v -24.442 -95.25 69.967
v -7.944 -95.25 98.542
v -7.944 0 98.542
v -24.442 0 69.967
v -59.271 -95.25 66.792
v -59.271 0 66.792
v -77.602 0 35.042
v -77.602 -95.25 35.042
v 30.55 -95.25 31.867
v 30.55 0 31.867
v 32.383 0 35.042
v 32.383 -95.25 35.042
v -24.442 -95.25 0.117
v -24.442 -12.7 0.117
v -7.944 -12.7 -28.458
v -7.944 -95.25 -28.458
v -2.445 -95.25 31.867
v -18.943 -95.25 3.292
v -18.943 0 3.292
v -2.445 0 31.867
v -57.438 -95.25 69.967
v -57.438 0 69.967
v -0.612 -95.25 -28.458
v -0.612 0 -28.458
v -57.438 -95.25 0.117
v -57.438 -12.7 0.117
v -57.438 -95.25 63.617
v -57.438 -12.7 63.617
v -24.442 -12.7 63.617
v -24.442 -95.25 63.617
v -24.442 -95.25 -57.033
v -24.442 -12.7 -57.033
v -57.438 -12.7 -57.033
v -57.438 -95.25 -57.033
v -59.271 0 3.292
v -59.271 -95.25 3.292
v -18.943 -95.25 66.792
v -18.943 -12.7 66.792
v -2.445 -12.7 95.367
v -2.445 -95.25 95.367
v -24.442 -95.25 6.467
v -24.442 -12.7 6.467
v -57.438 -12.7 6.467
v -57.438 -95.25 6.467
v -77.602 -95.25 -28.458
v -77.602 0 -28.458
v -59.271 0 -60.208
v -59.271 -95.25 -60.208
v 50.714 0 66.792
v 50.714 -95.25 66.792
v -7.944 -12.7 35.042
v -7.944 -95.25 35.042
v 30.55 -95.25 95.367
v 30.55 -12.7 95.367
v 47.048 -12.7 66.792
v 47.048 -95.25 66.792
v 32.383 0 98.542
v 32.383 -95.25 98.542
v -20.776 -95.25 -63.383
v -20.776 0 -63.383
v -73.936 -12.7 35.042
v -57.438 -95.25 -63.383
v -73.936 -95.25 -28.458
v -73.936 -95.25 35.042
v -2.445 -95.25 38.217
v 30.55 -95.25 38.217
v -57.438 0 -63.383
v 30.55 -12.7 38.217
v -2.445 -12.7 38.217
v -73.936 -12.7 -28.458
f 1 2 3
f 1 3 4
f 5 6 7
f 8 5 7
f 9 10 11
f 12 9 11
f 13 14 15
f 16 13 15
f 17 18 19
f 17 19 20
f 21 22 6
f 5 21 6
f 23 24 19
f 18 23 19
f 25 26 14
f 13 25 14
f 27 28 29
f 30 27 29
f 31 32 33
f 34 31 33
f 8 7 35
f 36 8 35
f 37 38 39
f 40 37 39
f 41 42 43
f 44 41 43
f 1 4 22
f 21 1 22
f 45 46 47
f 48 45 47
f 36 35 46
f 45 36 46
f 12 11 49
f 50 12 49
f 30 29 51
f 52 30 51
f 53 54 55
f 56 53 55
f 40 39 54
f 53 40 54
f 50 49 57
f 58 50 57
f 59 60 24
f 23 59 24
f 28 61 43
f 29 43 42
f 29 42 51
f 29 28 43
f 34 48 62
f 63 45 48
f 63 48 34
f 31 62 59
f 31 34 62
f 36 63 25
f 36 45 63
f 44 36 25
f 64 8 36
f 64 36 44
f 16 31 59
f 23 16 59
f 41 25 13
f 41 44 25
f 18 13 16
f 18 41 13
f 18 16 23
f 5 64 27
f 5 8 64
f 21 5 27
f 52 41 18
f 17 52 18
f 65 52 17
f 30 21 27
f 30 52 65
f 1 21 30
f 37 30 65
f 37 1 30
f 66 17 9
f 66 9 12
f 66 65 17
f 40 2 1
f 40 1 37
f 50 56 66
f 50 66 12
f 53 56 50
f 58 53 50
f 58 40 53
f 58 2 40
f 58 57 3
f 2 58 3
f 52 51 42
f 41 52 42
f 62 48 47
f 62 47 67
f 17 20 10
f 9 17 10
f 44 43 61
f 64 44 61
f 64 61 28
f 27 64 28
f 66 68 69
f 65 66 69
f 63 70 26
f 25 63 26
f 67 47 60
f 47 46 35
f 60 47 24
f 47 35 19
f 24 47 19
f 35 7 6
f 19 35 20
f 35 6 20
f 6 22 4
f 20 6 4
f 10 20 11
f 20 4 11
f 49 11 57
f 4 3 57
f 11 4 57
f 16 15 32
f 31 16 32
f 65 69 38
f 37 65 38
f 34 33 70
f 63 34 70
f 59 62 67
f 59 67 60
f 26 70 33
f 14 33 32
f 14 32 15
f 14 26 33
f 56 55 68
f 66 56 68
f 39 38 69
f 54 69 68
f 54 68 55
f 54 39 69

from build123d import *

# Parameters (mm, degrees)
F1_DEPTH = 12.7
F2_DEPTH = 95.25


# Not quite as in the source:
# - a feature names something its author has since deleted; it is built from what else it names


with BuildPart() as f1:
    # F0 (on Front) → F1 (new body)
    with BuildSketch(Plane.XZ):
        Polygon((-4.278267482, -28.4575006988), (-22.6091385288, 3.2924993012), (-59.2708806223, 3.2924993012), (-77.6017516691, -28.4575006988), (-59.2708806223, -60.2075006988), (-22.6091385288, -60.2075006988), align=None)
        Polygon((-57.4377935176, -57.0325006988), (-73.9355774597, -28.4575006988), (-57.4377935176, 0.1174993012), (-24.4422256334, 0.1174993012), (-7.9444416913, -28.4575006988), (-24.4422256334, -57.0325006988), align=None, mode=Mode.SUBTRACT)
        Polygon((-22.6091385288, 3.2924993012), (-4.278267482, 35.0424993012), (-22.6091385288, 66.7924993012), (-27.4963065598, 66.7924993012), (-59.2708806223, 66.7924993012), (-77.6017516691, 35.0424993012), (-59.2708806223, 3.2924993012), align=None)
        Polygon((-57.4377935176, 6.4674993012), (-73.9355774597, 35.0424993012), (-57.4377935176, 63.6174993012), (-24.4422256334, 63.6174993012), (-7.9444416913, 35.0424993012), (-24.4422256334, 6.4674993012), align=None, mode=Mode.SUBTRACT)
        Polygon((-22.6091385288, 66.7924993012), (-4.278267482, 35.0424993012), (27.4963065701, 35.0424993012), (32.3834746115, 35.0424993012), (50.7143456583, 66.7924993012), (32.3834746115, 98.5424993012), (-4.278267482, 98.5424993012), align=None)
        Polygon((-2.4451803773, 38.2174993012), (-18.9429643194, 66.7924993012), (-2.4451803773, 95.3674993012), (30.5503875069, 95.3674993012), (47.048171449, 66.7924993012), (30.5503875069, 38.2174993012), align=None, mode=Mode.SUBTRACT)
        Polygon((-2.4451803773, 95.3674993012), (-18.9429643194, 66.7924993012), (-2.4451803773, 38.2174993012), (30.5503875069, 38.2174993012), (47.048171449, 66.7924993012), (30.5503875069, 95.3674993012), align=None)
        Polygon((-57.4377935176, 0.1174993012), (-73.9355774597, -28.4575006988), (-57.4377935176, -57.0325006988), (-24.4422256334, -57.0325006988), (-7.9444416913, -28.4575006988), (-24.4422256334, 0.1174993012), align=None)
        Polygon((-57.4377935176, 63.6174993012), (-73.9355774597, 35.0424993012), (-57.4377935176, 6.4674993012), (-24.4422256334, 6.4674993012), (-7.9444416913, 35.0424993012), (-24.4422256334, 63.6174993012), align=None)
    extrude(amount=F1_DEPTH)

    # F0 (on Front) → F2 (join)
    with BuildSketch(Plane.XZ):
        Polygon((-22.6091385288, 3.2924993012), (-4.278267482, 35.0424993012), (-22.6091385288, 66.7924993012), (-27.4963065598, 66.7924993012), (-59.2708806223, 66.7924993012), (-77.6017516691, 35.0424993012), (-59.2708806223, 3.2924993012), align=None)
        Polygon((-57.4377935176, 6.4674993012), (-73.9355774597, 35.0424993012), (-57.4377935176, 63.6174993012), (-24.4422256334, 63.6174993012), (-7.9444416913, 35.0424993012), (-24.4422256334, 6.4674993012), align=None, mode=Mode.SUBTRACT)
        Polygon((-22.6091385288, 66.7924993012), (-4.278267482, 35.0424993012), (27.4963065701, 35.0424993012), (32.3834746115, 35.0424993012), (50.7143456583, 66.7924993012), (32.3834746115, 98.5424993012), (-4.278267482, 98.5424993012), align=None)
        Polygon((-2.4451803773, 38.2174993012), (-18.9429643194, 66.7924993012), (-2.4451803773, 95.3674993012), (30.5503875069, 95.3674993012), (47.048171449, 66.7924993012), (30.5503875069, 38.2174993012), align=None, mode=Mode.SUBTRACT)
        Polygon((-4.278267482, -28.4575006988), (-22.6091385288, 3.2924993012), (-59.2708806223, 3.2924993012), (-77.6017516691, -28.4575006988), (-59.2708806223, -60.2075006988), (-22.6091385288, -60.2075006988), align=None)
        Polygon((-57.4377935176, -57.0325006988), (-73.9355774597, -28.4575006988), (-57.4377935176, 0.1174993012), (-24.4422256334, 0.1174993012), (-7.9444416913, -28.4575006988), (-24.4422256334, -57.0325006988), align=None, mode=Mode.SUBTRACT)
        Polygon((27.4963065701, 35.0424993012), (-4.278267482, 35.0424993012), (-22.6091385288, 3.2924993012), (-4.278267482, -28.4575006988), (-22.6091385288, -60.2075006988), (-59.2708806223, -60.2075006988), (-57.4378374826, -63.3825006988), (-20.7760404334, -63.3825006988), (-0.612082282, -28.4575006988), (-18.9429533288, 3.2924993012), (-2.4451693867, 31.8674993012), (30.5503875069, 31.8674993012), (32.3834746115, 35.0424993012), align=None)
        Polygon((-27.4963065598, 66.7924993012), (-22.6091385288, 66.7924993012), (-4.278267482, 98.5424993012), (-7.9444416913, 98.5424993012), (-24.4422256334, 69.9674993012), (-57.4377935176, 69.9674993012), (-59.2708806223, 66.7924993012), align=None)
    extrude(amount=F2_DEPTH)


solid = f1.part
